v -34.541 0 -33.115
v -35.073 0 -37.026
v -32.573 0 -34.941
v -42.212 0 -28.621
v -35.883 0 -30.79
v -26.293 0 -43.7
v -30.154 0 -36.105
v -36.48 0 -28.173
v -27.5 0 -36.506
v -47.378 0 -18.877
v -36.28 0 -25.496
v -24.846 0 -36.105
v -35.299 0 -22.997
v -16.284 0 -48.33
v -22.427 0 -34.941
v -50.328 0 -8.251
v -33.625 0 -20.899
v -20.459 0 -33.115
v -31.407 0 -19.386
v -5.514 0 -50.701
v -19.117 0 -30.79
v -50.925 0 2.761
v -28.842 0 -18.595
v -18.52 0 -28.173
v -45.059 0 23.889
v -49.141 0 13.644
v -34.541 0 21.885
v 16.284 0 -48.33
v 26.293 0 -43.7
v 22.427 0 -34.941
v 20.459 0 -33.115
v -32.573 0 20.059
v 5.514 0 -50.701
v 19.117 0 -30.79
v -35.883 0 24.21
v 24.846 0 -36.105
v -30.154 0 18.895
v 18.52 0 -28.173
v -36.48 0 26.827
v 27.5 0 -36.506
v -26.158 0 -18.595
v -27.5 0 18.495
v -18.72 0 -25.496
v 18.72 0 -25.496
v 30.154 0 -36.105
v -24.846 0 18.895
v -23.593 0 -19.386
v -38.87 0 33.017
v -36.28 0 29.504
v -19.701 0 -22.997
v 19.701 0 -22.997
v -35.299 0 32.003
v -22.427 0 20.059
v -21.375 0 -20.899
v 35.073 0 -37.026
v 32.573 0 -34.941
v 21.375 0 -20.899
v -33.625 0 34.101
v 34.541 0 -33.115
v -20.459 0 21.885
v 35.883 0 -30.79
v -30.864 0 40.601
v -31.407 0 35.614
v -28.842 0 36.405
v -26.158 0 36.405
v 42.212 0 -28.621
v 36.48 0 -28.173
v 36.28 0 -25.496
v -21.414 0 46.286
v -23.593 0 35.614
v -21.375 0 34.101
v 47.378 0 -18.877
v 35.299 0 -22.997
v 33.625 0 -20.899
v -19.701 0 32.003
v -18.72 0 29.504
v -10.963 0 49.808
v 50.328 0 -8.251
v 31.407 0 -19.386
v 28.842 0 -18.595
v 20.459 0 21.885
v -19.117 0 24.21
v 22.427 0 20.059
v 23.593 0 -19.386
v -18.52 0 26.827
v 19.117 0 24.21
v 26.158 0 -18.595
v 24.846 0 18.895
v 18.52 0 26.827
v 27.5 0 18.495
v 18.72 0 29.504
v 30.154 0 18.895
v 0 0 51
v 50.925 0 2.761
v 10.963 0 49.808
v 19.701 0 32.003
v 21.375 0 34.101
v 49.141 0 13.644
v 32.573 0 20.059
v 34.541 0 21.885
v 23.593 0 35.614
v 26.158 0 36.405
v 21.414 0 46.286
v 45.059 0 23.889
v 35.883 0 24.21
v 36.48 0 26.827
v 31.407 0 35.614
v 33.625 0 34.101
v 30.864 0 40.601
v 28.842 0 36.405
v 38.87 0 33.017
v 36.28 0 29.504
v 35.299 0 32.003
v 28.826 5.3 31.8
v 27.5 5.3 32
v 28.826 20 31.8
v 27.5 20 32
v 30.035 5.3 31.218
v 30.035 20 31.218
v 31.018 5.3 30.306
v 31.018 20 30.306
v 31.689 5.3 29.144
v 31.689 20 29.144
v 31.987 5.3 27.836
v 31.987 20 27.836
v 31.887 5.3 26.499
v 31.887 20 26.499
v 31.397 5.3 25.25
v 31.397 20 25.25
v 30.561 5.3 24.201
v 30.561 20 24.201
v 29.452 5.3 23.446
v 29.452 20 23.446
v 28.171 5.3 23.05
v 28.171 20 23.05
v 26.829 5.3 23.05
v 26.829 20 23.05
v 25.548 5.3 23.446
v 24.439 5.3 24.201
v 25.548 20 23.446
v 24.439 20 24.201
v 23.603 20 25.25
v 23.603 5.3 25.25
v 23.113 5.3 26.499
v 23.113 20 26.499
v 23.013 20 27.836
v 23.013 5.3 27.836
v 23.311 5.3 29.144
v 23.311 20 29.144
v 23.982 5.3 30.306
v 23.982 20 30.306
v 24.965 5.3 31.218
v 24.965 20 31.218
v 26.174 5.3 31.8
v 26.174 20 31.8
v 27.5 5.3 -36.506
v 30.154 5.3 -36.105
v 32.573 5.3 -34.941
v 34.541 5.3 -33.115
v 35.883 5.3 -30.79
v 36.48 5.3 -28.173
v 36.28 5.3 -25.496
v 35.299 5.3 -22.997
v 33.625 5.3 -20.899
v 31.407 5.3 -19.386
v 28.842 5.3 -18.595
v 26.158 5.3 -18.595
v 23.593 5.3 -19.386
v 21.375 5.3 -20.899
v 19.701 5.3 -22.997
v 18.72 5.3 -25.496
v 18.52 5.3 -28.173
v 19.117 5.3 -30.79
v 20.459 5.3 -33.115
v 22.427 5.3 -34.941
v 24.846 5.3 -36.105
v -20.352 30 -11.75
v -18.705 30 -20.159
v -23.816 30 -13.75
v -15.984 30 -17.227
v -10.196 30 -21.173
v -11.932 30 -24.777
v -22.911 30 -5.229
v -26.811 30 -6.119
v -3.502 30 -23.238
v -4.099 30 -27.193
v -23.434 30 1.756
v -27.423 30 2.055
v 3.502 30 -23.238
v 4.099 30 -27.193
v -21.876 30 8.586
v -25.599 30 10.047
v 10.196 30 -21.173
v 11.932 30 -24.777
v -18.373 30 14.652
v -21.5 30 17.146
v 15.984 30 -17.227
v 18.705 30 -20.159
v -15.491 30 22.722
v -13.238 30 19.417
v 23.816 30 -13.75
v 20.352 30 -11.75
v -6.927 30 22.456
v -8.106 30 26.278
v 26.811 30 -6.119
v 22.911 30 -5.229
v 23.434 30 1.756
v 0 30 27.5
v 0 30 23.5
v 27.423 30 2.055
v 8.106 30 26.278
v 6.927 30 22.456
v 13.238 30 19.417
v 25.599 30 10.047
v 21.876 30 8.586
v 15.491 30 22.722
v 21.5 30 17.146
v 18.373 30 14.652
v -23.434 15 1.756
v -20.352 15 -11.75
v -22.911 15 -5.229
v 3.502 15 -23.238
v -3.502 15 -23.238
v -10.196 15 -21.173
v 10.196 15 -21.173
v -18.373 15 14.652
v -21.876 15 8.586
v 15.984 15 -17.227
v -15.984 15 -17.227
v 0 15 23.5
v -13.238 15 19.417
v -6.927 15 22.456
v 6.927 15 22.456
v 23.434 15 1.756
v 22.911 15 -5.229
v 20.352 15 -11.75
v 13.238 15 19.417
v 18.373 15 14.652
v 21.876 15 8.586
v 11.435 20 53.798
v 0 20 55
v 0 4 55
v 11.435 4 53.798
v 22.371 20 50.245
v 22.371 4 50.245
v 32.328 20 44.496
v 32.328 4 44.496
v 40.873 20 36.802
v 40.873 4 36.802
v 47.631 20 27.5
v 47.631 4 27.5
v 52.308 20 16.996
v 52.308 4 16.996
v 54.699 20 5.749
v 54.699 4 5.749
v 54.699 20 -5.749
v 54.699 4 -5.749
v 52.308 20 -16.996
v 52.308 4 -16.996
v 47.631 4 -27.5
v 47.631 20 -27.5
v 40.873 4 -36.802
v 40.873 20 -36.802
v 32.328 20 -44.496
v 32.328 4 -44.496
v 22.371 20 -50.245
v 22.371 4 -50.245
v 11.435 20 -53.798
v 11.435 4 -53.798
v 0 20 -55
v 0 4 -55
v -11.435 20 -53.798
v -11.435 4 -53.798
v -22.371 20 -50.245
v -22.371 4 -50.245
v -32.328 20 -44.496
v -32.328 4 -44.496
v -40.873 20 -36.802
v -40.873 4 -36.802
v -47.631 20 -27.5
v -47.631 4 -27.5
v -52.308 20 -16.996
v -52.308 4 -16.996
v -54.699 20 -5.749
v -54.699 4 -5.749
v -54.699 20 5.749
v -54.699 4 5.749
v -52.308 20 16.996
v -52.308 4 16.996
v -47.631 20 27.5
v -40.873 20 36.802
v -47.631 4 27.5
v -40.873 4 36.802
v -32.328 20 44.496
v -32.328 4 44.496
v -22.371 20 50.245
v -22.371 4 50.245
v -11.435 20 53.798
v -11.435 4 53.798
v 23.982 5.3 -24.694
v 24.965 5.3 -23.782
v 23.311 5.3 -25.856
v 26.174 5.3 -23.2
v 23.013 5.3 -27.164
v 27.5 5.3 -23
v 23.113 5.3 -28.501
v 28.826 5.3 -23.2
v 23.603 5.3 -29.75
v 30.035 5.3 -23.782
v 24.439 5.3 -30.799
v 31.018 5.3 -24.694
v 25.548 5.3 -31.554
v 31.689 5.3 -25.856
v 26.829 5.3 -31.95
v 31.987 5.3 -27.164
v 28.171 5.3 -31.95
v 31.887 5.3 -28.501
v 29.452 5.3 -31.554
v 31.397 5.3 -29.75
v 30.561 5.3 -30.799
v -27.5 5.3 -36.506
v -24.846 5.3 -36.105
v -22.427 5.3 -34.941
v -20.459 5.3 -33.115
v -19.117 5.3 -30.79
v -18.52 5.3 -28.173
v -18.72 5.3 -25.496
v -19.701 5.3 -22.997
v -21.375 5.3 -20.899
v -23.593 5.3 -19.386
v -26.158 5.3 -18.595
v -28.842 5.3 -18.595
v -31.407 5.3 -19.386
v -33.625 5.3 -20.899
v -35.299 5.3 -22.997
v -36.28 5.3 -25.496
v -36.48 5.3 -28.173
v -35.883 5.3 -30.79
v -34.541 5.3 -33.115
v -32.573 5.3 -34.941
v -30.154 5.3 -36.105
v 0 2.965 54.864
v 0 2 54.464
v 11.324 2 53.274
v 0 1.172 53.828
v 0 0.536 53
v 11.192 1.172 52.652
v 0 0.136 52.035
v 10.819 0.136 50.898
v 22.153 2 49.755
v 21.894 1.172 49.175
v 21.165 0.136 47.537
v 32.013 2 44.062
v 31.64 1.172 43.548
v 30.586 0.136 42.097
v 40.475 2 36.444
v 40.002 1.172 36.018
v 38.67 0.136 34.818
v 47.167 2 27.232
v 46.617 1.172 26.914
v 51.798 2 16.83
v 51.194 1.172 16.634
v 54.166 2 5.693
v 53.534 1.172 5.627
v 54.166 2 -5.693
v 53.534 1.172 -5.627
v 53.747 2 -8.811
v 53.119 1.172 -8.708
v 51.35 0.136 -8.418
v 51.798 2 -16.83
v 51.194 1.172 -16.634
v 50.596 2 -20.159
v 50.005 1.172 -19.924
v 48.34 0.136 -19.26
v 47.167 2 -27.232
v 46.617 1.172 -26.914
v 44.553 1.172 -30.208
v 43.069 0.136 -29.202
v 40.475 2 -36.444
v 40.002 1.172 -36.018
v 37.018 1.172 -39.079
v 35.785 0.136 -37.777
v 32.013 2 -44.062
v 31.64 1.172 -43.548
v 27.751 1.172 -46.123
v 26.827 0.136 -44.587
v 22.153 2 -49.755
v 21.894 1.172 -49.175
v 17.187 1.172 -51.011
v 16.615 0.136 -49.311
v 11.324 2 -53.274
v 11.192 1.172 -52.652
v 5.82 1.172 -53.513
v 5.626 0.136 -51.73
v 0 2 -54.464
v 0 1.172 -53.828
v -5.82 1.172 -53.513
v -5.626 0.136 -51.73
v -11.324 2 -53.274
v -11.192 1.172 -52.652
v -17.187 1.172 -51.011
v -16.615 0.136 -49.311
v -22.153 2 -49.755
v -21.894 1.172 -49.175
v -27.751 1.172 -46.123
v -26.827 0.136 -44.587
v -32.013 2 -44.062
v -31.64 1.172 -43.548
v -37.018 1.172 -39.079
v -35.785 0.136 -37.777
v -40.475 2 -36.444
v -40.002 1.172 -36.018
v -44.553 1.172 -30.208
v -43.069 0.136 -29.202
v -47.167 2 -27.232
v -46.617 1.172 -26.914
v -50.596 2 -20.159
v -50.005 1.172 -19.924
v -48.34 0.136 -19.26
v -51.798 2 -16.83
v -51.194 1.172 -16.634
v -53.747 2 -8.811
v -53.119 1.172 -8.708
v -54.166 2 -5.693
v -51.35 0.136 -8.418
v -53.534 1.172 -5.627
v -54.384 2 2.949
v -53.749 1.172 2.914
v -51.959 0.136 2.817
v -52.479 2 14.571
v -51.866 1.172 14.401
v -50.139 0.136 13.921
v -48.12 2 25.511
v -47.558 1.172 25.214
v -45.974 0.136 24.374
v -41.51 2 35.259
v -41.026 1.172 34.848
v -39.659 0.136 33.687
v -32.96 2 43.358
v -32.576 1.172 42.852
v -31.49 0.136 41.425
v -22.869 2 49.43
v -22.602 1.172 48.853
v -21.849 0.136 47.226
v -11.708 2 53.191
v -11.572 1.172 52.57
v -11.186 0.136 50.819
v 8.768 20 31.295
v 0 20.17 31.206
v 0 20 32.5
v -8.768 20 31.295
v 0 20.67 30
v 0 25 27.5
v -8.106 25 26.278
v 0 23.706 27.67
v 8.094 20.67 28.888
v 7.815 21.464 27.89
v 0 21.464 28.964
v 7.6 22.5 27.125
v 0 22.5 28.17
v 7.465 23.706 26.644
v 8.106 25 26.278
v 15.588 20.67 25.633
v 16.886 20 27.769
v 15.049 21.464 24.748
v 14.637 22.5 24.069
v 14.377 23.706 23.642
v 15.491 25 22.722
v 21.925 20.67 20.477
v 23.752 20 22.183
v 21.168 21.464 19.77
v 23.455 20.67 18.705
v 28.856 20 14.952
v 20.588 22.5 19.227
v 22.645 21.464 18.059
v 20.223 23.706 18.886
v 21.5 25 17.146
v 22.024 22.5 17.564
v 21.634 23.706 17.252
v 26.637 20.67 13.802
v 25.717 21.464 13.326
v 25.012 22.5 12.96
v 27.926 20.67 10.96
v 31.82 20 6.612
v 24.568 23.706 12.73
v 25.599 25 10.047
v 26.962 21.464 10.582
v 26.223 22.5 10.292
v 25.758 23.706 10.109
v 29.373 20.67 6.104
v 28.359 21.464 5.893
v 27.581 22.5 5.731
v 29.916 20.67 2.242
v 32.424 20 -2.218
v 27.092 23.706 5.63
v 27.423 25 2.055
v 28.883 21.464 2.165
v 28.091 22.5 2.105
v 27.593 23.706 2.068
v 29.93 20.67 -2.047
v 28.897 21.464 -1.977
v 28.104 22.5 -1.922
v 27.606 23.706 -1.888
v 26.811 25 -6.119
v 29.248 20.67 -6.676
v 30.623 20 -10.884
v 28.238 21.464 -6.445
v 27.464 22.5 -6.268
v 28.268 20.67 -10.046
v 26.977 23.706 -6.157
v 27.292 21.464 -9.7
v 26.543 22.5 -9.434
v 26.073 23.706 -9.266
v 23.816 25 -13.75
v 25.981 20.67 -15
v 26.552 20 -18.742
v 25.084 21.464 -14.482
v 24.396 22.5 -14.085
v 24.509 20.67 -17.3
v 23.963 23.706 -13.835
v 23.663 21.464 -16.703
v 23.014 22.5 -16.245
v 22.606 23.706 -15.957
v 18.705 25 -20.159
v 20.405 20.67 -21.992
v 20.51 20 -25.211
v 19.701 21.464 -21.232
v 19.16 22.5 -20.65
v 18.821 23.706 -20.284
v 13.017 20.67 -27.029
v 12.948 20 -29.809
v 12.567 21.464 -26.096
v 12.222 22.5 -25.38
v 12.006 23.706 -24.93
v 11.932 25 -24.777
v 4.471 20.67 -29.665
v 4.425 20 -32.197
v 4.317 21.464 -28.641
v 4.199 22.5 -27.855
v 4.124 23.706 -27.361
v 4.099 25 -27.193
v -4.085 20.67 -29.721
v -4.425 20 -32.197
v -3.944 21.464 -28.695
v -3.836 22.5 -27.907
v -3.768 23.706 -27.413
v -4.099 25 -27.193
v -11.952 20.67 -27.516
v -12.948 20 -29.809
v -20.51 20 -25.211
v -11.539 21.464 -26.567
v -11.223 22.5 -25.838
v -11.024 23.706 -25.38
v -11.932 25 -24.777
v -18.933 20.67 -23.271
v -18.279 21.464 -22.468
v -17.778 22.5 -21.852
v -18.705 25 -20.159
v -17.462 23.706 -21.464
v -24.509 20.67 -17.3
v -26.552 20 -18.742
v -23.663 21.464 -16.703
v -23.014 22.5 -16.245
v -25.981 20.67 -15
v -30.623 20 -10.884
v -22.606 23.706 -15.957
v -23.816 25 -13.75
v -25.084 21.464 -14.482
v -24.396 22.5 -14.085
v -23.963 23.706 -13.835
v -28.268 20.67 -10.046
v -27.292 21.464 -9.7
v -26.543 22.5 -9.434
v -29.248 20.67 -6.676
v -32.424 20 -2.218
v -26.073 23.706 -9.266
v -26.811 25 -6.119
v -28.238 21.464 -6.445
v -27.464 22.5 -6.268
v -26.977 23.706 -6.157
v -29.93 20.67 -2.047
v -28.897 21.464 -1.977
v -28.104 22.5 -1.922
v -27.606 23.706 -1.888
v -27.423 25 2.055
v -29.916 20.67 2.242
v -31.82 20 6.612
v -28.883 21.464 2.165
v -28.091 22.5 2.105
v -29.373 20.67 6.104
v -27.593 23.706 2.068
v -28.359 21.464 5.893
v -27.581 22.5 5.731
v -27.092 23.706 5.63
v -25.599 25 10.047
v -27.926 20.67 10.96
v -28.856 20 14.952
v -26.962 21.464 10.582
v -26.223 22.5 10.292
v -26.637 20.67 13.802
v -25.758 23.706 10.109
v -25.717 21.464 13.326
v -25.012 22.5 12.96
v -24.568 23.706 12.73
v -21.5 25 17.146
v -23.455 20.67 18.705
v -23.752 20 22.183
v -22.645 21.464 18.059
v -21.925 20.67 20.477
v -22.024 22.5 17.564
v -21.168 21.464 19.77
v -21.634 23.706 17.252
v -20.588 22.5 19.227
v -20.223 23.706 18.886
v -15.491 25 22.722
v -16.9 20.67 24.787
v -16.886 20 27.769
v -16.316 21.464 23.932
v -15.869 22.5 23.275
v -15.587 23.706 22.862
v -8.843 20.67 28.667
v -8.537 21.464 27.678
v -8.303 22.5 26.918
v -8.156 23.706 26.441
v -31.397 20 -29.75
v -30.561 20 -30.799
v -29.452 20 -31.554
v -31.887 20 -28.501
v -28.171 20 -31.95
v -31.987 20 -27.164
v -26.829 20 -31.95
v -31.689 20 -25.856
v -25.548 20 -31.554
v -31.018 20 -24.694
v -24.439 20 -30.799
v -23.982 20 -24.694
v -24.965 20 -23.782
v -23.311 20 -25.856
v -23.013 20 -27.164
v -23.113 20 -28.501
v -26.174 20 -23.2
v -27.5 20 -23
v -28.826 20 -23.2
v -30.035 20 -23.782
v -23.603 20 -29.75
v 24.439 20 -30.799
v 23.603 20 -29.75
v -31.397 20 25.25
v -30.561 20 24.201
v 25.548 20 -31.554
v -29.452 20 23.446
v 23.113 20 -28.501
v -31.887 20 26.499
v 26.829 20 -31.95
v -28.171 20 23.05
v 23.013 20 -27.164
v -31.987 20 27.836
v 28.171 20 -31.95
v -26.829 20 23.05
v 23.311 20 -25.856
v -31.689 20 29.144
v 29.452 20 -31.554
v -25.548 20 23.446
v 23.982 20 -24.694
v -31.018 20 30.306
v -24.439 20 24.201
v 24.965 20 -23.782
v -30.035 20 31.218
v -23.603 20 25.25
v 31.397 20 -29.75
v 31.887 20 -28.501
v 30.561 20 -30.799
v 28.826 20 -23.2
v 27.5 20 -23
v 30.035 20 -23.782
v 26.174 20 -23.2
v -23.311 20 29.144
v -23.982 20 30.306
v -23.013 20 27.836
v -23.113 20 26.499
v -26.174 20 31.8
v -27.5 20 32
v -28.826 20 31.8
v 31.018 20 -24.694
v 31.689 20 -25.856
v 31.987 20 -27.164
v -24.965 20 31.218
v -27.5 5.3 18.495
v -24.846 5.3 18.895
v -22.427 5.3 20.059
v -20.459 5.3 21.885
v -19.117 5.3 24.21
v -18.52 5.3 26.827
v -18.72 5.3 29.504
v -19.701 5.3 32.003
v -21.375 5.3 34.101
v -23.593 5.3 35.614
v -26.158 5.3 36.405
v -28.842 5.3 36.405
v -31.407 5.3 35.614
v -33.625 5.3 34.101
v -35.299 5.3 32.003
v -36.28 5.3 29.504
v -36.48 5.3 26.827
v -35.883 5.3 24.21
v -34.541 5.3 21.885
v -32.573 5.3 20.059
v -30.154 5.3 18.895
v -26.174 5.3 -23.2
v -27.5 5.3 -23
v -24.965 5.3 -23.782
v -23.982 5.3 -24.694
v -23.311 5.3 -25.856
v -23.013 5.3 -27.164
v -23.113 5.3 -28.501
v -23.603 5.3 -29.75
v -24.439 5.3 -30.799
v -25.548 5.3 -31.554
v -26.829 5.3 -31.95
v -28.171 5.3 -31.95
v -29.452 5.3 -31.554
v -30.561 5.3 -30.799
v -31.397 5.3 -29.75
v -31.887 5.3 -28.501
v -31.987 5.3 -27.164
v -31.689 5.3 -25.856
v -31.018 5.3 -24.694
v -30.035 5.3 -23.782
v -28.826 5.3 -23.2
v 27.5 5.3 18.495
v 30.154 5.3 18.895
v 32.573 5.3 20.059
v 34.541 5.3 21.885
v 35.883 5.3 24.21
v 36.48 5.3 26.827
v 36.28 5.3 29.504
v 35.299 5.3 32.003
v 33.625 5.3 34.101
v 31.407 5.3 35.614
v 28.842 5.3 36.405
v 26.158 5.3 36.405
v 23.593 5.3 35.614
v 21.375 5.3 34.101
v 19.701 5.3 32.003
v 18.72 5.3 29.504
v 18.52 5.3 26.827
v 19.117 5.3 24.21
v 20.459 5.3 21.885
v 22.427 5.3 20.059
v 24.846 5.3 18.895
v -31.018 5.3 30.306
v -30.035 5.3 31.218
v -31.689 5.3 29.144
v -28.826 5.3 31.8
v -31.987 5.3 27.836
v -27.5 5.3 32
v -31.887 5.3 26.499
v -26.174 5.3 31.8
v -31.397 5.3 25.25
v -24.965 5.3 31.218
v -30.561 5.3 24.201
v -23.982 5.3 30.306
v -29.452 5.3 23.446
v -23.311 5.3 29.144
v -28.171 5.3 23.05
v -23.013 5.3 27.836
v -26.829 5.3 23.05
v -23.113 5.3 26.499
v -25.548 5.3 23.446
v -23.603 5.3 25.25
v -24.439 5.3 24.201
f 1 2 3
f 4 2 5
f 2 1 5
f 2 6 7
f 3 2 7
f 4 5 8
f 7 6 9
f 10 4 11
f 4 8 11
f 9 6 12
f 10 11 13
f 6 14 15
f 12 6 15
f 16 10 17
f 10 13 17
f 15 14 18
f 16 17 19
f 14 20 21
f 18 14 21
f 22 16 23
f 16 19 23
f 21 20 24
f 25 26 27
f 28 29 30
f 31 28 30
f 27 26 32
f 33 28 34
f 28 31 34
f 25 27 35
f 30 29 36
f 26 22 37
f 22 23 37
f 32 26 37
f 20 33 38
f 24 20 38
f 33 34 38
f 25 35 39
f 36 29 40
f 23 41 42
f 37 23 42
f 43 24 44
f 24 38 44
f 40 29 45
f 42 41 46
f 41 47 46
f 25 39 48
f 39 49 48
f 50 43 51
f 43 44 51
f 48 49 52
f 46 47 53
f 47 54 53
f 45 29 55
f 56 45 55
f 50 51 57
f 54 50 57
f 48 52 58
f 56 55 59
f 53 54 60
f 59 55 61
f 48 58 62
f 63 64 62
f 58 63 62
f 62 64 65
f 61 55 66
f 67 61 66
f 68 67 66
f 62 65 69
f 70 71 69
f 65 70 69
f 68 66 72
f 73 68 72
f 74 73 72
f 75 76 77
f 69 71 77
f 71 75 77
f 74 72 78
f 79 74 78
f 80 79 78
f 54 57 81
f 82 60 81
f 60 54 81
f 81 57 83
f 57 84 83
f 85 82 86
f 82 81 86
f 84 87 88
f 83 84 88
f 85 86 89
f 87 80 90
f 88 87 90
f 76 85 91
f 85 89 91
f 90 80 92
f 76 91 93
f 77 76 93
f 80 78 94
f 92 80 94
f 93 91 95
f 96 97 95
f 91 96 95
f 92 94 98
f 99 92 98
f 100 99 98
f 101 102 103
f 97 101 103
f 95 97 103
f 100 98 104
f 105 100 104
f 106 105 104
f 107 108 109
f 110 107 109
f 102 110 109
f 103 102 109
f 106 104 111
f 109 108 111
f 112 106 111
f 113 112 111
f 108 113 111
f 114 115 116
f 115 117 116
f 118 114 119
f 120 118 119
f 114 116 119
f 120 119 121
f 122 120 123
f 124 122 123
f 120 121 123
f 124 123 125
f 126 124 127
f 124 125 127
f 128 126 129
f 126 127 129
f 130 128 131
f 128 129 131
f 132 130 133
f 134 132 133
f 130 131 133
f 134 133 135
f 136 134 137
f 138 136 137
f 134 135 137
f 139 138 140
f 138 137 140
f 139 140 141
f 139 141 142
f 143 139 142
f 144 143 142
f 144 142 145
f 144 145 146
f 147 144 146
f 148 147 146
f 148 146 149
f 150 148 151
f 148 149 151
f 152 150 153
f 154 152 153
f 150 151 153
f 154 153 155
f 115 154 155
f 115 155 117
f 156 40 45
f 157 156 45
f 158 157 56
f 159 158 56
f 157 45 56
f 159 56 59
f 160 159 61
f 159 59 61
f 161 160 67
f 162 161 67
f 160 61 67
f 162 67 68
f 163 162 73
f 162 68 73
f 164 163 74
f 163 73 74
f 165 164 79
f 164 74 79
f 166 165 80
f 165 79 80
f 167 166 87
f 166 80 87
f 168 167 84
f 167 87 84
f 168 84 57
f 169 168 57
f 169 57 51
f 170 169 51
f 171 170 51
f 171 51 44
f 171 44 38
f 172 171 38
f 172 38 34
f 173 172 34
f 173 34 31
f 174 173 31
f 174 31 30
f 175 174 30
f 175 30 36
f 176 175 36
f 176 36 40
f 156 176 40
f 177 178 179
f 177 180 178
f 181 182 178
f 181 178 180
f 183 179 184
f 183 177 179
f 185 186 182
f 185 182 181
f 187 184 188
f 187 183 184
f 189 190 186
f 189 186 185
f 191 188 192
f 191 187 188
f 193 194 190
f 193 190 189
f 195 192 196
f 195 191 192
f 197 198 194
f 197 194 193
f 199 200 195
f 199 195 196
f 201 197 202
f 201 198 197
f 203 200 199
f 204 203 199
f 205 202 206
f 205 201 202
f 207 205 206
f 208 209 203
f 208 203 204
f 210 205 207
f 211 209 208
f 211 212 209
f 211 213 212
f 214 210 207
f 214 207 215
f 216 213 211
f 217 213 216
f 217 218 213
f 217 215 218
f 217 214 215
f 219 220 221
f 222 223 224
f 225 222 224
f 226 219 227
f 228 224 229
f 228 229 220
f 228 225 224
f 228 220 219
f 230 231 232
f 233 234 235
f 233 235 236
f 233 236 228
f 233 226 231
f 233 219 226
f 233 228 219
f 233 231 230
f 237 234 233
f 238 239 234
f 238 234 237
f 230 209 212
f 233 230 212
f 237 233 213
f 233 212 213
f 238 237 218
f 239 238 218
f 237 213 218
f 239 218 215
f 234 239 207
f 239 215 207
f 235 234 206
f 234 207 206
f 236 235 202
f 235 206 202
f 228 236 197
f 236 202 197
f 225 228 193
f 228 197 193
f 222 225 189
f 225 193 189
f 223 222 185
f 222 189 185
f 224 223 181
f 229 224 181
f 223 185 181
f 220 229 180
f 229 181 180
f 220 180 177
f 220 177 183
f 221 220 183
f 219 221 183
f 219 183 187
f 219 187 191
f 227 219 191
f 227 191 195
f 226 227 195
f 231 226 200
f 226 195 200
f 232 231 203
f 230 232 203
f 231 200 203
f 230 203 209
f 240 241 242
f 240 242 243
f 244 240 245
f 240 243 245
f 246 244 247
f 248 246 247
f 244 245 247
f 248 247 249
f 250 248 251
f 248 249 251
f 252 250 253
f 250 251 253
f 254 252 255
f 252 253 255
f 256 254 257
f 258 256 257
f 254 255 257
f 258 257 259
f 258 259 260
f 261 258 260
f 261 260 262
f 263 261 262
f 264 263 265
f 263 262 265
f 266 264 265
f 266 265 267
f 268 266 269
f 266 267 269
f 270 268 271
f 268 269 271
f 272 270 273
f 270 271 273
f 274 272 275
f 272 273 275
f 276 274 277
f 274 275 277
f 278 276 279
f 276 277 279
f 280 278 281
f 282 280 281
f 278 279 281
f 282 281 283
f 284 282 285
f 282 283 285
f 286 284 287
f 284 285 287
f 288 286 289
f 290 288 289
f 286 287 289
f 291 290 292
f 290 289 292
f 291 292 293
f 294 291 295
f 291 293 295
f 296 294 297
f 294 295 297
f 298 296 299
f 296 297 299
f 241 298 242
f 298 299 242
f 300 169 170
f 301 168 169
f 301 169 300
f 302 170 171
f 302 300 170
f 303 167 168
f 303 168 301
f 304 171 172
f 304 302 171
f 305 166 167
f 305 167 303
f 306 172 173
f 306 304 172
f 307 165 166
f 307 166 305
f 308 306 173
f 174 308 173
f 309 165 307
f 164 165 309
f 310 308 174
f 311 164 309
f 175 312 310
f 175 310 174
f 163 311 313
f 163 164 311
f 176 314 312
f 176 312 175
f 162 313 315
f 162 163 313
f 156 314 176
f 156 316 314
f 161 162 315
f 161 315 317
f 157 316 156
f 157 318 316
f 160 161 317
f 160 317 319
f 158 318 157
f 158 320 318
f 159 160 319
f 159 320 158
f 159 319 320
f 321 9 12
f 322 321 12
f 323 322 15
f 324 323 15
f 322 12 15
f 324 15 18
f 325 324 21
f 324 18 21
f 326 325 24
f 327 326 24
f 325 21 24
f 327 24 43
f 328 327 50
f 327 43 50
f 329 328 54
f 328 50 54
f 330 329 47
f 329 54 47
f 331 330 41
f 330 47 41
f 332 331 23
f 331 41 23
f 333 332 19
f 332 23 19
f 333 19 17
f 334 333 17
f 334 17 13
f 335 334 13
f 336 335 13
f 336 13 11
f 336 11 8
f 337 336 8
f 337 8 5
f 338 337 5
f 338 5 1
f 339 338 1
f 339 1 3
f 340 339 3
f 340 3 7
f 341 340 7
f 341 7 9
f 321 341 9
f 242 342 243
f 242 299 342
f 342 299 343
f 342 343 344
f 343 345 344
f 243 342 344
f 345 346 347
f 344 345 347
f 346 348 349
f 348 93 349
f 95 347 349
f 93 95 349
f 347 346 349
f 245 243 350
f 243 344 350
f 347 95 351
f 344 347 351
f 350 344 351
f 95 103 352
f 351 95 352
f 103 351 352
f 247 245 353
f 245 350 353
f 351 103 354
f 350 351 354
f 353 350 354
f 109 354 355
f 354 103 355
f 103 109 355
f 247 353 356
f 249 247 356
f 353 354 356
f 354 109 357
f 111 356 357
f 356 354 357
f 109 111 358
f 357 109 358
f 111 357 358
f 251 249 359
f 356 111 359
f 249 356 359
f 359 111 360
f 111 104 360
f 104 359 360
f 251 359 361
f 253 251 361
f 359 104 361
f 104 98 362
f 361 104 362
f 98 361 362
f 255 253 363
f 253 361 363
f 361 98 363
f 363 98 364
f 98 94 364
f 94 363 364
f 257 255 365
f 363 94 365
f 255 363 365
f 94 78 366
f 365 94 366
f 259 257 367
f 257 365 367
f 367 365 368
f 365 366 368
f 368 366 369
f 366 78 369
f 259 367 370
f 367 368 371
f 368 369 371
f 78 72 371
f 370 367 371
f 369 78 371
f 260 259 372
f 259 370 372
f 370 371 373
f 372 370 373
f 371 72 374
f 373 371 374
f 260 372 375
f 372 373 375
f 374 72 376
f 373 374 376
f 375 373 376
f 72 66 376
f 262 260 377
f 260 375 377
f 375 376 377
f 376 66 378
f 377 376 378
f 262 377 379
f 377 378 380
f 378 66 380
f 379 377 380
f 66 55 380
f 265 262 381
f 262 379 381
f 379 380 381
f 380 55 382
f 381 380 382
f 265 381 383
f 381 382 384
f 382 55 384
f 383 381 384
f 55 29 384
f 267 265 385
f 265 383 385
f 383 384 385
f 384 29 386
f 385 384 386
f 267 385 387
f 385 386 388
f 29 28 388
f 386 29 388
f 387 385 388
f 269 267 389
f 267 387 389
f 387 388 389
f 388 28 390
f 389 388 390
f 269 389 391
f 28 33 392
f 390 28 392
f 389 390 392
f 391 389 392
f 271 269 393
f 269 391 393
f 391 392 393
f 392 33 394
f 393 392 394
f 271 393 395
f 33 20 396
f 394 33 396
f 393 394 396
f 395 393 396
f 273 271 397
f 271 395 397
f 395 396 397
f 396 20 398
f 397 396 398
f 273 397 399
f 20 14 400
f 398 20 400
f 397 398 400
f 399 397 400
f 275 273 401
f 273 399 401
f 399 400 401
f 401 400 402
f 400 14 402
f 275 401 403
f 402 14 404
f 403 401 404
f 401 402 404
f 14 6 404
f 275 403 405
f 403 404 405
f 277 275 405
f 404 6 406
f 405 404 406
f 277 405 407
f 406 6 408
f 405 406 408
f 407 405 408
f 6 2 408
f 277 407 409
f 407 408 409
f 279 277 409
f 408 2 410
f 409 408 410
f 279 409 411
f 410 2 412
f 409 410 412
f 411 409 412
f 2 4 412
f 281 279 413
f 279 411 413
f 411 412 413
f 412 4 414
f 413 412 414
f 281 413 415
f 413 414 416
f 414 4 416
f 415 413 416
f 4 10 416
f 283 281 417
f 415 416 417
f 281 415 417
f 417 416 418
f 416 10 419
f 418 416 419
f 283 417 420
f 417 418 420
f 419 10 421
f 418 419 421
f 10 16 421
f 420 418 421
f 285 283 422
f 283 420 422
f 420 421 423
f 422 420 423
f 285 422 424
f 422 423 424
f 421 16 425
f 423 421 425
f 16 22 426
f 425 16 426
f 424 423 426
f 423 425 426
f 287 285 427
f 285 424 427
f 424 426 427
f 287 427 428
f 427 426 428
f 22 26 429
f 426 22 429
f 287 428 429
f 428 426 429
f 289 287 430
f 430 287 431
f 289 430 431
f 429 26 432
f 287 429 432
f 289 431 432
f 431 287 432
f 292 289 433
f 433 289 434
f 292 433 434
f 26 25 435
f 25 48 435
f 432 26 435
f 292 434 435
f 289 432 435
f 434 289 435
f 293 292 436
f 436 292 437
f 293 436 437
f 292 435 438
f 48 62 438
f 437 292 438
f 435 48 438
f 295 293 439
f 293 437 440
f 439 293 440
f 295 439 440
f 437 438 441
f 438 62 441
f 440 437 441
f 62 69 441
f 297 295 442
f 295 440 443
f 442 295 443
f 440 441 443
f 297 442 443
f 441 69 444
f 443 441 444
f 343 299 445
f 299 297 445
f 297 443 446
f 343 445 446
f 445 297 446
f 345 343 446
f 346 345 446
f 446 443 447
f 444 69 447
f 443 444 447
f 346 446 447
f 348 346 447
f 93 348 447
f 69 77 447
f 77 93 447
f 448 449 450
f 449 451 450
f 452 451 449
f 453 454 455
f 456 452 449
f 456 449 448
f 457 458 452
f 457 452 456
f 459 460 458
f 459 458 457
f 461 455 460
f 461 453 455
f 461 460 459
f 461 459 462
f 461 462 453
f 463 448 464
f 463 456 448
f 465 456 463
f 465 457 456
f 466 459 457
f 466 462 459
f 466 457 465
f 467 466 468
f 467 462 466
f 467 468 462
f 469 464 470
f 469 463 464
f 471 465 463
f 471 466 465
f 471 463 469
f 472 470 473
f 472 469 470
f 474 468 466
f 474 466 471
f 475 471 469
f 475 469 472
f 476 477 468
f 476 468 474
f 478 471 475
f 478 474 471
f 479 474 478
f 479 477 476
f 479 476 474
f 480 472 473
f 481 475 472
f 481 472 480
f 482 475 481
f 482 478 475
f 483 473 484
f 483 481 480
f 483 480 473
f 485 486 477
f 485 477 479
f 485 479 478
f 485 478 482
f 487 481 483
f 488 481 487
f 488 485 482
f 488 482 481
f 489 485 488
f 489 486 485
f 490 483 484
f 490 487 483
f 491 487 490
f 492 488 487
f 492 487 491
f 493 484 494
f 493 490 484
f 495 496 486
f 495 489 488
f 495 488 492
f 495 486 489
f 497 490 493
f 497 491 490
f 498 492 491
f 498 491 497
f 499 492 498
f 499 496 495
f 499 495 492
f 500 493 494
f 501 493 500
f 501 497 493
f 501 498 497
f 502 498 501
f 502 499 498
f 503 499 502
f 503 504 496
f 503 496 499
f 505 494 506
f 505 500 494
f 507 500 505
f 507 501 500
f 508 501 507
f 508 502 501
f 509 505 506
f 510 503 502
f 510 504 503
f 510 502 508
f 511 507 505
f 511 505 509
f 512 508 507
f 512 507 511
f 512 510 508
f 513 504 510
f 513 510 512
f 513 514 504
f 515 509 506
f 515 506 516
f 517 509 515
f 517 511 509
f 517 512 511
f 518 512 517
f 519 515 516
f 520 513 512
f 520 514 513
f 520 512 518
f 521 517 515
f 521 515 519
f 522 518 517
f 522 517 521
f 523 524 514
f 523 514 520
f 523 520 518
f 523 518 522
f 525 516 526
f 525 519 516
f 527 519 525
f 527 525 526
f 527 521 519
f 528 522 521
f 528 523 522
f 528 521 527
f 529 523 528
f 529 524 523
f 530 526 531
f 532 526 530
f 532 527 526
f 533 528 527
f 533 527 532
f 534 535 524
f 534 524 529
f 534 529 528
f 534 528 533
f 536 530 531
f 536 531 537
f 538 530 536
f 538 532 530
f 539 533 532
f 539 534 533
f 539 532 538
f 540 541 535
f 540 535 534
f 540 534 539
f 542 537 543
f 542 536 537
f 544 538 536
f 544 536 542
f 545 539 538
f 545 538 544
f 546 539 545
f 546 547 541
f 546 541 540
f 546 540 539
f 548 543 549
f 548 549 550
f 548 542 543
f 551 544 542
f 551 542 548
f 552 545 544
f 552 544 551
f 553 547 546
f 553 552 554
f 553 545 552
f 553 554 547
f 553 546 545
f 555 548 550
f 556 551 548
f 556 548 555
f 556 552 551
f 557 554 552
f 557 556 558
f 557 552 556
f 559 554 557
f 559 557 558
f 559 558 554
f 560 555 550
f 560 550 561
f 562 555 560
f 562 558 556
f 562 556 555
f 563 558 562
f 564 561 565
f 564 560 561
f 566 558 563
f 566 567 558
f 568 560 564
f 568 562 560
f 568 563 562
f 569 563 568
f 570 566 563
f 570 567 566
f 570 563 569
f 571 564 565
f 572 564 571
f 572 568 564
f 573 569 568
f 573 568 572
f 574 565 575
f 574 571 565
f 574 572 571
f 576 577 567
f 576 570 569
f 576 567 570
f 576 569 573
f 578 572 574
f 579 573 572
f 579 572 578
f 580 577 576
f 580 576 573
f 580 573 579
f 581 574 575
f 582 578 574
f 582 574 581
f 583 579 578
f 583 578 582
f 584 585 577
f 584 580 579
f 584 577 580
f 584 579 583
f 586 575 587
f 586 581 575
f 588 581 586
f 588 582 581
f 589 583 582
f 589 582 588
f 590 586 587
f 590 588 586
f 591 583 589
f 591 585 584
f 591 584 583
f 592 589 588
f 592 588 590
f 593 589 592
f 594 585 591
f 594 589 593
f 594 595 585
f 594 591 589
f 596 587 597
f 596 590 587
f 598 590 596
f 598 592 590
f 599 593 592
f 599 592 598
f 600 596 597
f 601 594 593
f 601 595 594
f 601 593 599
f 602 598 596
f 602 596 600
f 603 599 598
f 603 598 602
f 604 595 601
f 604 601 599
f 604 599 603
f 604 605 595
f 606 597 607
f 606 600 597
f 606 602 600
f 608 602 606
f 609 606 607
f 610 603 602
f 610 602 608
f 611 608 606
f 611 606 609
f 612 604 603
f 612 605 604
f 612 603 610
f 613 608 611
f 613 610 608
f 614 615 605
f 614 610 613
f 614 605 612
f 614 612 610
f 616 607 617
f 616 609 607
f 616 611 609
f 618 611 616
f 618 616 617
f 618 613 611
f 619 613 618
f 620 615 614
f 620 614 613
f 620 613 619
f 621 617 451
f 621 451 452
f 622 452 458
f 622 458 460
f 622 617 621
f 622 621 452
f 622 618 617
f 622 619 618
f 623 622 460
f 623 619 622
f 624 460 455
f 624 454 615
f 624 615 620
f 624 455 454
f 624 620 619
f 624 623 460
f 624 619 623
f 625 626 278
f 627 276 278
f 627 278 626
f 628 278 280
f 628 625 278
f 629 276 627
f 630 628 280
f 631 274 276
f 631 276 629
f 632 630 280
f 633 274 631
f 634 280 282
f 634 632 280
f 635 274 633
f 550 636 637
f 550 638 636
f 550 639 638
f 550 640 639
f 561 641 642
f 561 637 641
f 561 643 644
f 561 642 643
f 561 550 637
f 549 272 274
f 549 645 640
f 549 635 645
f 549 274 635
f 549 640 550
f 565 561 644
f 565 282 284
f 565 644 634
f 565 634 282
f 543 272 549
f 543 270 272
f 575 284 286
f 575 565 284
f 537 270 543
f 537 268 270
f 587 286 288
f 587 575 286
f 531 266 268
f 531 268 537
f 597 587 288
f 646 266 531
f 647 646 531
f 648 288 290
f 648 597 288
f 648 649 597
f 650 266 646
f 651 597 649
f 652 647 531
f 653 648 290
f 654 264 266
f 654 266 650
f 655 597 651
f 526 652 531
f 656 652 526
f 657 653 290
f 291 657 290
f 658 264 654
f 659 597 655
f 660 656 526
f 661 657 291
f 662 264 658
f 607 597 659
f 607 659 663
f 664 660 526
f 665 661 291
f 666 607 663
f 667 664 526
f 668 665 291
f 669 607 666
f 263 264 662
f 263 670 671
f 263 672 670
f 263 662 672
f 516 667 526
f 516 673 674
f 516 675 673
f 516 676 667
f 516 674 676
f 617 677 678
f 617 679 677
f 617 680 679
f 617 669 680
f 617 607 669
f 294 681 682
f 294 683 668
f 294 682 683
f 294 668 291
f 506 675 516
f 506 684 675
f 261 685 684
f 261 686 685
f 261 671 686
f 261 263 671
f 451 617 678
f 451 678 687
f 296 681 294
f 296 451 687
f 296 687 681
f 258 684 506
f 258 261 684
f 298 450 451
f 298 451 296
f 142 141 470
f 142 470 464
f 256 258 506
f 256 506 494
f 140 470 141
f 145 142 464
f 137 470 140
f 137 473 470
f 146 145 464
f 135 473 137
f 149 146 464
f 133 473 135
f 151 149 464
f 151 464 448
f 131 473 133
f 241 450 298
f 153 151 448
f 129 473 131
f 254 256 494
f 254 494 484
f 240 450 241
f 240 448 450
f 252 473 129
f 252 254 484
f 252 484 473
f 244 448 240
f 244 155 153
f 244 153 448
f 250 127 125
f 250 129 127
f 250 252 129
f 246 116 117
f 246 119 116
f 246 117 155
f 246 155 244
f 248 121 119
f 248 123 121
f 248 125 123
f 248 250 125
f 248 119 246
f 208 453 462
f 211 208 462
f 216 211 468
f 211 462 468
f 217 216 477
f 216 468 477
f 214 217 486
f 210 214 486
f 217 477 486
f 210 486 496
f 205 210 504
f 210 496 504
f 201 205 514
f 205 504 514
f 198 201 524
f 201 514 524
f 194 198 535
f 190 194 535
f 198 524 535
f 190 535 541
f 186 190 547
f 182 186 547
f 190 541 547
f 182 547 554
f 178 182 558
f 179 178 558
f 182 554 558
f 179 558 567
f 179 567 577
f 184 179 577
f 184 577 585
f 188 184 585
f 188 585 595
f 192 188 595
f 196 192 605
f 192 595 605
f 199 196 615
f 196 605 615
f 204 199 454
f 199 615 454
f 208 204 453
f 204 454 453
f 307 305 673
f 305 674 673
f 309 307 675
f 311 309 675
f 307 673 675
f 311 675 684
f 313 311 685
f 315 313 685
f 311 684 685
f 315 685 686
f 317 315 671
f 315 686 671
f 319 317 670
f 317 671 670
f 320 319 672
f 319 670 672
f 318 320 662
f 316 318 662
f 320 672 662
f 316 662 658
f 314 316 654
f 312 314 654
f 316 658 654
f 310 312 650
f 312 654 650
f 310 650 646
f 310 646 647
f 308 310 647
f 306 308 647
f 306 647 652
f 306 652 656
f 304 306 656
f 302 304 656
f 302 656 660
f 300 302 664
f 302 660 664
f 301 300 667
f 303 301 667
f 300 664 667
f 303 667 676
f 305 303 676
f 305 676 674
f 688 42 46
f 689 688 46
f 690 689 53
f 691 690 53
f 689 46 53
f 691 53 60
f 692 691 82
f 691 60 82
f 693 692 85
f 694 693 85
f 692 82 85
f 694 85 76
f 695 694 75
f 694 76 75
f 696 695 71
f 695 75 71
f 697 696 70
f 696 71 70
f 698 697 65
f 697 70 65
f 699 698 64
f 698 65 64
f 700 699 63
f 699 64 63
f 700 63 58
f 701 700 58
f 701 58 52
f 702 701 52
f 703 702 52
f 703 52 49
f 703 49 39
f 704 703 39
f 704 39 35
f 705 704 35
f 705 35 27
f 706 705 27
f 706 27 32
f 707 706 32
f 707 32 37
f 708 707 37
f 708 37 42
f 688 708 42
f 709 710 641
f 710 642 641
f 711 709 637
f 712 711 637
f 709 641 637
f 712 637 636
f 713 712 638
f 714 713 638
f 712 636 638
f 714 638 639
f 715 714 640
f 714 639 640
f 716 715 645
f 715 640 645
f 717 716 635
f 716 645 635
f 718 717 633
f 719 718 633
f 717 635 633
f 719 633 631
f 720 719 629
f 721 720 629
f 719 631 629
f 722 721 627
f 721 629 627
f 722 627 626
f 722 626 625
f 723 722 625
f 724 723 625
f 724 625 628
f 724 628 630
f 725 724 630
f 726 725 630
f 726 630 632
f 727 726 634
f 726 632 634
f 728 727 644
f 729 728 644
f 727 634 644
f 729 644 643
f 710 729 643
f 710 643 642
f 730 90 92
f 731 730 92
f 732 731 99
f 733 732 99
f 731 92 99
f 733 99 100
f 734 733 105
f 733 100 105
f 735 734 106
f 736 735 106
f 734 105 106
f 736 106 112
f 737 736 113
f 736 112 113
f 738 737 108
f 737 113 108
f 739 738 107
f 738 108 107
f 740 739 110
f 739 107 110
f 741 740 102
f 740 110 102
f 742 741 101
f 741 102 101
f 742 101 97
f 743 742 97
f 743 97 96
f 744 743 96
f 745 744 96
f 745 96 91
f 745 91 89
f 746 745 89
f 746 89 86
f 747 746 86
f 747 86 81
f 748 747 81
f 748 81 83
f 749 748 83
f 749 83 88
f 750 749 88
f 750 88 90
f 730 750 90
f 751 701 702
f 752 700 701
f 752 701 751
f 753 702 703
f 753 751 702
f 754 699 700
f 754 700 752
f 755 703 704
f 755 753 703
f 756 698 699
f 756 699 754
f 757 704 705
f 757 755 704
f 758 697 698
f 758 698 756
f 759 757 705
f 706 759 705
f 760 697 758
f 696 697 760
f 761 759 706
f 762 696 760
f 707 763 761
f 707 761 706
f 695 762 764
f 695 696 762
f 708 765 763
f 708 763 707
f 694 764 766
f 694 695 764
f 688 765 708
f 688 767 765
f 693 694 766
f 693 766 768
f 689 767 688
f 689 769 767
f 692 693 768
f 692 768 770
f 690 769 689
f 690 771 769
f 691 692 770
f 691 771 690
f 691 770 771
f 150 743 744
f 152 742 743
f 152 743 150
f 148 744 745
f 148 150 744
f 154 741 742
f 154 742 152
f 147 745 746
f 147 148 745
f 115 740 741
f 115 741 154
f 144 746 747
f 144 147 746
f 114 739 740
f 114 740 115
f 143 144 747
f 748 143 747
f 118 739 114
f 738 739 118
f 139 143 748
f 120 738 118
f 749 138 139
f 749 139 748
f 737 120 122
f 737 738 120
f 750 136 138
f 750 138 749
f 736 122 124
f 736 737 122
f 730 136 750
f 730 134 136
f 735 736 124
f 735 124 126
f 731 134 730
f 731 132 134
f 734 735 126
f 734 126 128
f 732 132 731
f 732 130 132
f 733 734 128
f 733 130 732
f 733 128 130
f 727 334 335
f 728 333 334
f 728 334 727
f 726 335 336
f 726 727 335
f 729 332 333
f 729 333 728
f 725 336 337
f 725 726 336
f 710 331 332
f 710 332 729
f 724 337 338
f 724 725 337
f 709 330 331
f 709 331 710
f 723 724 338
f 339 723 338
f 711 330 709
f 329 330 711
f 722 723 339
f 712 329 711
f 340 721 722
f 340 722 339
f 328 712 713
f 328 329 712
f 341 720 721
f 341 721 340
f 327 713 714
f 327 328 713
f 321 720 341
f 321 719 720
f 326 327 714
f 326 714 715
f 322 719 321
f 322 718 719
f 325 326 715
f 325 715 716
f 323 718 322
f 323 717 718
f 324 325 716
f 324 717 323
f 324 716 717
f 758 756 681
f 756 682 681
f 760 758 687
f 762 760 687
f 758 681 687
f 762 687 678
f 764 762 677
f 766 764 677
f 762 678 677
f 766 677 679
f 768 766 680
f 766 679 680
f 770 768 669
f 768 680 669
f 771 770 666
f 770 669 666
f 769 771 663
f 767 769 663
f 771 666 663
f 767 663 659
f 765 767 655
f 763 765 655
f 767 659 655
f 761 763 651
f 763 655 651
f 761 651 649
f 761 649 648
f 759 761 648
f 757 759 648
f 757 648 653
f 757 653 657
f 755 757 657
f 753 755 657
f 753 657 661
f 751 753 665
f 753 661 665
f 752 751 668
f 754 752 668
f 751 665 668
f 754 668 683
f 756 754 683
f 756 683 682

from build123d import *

# Parameters (mm, degrees)
SKETCH1_R                               = 55
BOSS_EXTRUDE1_DEPTH                     = 20
SKETCH2_R                               = 27.5
BOSS_EXTRUDE2_DEPTH                     = 10
SKETCH6_R                               = 23.5
CUT_EXTRUDE1_DEPTH                      = 15
FILLET1_R                               = 5
CBORE_FOR_M8_HEX_HEAD_BOLT1_D           = 9
CBORE_FOR_M8_HEX_HEAD_BOLT1_CBORE_D     = 18.011
CBORE_FOR_M8_HEX_HEAD_BOLT1_CBORE_DEPTH = 5.3
FILLET2_R                               = 4


with BuildPart() as part:
    # Sketch1 → Boss-Extrude1 (new body)
    with BuildSketch(Plane(origin=(0, 0, 0), x_dir=(1, 0, 0), z_dir=(0, 1, 0))):
        with Locations(Location((0, 0, 0), (0, 0, 270))):
            Circle(SKETCH1_R)
    extrude(amount=BOSS_EXTRUDE1_DEPTH)

    # Sketch2 → Boss-Extrude2 (add)
    with BuildSketch(Plane(origin=(0, 20, 0), x_dir=(1, 0, 0), z_dir=(0, 1, 0))):
        with Locations(Location((0, 0, 0), (0, 0, 270))):
            Circle(SKETCH2_R)
    extrude(amount=BOSS_EXTRUDE2_DEPTH)

    # Sketch6 → Cut-Extrude1 (cut)
    with BuildSketch(Plane(origin=(0, 30, 0), x_dir=(1, 0, 0), z_dir=(0, 1, 0))):
        with Locations(Location((0, 0, 0), (0, 0, 270))):
            Circle(SKETCH6_R)
    extrude(amount=-CUT_EXTRUDE1_DEPTH, mode=Mode.SUBTRACT)

    # Fillet1
    fillet1_edges = [part.edges().sort_by_distance(p)[0] for p in [
        (0, 20, -27.5),
    ]]
    fillet(fillet1_edges, radius=FILLET1_R)

    # CBORE for M8 Hex Head Bolt1 (through all)
    with Locations(Plane(origin=(27.5, 0, -27.5), x_dir=(0, 0, -1), z_dir=(0, -1, 0))):
        with Locations((0, 0), (0, -55), (-55, -55), (-55, 0)):
            CounterBoreHole(CBORE_FOR_M8_HEX_HEAD_BOLT1_D / 2, CBORE_FOR_M8_HEX_HEAD_BOLT1_CBORE_D / 2, CBORE_FOR_M8_HEX_HEAD_BOLT1_CBORE_DEPTH)

    # Fillet2
    fillet2_edges = [part.edges().sort_by_distance(p)[0] for p in [
        (0, 0, -55),
    ]]
    fillet(fillet2_edges, radius=FILLET2_R)


solid = part.part
